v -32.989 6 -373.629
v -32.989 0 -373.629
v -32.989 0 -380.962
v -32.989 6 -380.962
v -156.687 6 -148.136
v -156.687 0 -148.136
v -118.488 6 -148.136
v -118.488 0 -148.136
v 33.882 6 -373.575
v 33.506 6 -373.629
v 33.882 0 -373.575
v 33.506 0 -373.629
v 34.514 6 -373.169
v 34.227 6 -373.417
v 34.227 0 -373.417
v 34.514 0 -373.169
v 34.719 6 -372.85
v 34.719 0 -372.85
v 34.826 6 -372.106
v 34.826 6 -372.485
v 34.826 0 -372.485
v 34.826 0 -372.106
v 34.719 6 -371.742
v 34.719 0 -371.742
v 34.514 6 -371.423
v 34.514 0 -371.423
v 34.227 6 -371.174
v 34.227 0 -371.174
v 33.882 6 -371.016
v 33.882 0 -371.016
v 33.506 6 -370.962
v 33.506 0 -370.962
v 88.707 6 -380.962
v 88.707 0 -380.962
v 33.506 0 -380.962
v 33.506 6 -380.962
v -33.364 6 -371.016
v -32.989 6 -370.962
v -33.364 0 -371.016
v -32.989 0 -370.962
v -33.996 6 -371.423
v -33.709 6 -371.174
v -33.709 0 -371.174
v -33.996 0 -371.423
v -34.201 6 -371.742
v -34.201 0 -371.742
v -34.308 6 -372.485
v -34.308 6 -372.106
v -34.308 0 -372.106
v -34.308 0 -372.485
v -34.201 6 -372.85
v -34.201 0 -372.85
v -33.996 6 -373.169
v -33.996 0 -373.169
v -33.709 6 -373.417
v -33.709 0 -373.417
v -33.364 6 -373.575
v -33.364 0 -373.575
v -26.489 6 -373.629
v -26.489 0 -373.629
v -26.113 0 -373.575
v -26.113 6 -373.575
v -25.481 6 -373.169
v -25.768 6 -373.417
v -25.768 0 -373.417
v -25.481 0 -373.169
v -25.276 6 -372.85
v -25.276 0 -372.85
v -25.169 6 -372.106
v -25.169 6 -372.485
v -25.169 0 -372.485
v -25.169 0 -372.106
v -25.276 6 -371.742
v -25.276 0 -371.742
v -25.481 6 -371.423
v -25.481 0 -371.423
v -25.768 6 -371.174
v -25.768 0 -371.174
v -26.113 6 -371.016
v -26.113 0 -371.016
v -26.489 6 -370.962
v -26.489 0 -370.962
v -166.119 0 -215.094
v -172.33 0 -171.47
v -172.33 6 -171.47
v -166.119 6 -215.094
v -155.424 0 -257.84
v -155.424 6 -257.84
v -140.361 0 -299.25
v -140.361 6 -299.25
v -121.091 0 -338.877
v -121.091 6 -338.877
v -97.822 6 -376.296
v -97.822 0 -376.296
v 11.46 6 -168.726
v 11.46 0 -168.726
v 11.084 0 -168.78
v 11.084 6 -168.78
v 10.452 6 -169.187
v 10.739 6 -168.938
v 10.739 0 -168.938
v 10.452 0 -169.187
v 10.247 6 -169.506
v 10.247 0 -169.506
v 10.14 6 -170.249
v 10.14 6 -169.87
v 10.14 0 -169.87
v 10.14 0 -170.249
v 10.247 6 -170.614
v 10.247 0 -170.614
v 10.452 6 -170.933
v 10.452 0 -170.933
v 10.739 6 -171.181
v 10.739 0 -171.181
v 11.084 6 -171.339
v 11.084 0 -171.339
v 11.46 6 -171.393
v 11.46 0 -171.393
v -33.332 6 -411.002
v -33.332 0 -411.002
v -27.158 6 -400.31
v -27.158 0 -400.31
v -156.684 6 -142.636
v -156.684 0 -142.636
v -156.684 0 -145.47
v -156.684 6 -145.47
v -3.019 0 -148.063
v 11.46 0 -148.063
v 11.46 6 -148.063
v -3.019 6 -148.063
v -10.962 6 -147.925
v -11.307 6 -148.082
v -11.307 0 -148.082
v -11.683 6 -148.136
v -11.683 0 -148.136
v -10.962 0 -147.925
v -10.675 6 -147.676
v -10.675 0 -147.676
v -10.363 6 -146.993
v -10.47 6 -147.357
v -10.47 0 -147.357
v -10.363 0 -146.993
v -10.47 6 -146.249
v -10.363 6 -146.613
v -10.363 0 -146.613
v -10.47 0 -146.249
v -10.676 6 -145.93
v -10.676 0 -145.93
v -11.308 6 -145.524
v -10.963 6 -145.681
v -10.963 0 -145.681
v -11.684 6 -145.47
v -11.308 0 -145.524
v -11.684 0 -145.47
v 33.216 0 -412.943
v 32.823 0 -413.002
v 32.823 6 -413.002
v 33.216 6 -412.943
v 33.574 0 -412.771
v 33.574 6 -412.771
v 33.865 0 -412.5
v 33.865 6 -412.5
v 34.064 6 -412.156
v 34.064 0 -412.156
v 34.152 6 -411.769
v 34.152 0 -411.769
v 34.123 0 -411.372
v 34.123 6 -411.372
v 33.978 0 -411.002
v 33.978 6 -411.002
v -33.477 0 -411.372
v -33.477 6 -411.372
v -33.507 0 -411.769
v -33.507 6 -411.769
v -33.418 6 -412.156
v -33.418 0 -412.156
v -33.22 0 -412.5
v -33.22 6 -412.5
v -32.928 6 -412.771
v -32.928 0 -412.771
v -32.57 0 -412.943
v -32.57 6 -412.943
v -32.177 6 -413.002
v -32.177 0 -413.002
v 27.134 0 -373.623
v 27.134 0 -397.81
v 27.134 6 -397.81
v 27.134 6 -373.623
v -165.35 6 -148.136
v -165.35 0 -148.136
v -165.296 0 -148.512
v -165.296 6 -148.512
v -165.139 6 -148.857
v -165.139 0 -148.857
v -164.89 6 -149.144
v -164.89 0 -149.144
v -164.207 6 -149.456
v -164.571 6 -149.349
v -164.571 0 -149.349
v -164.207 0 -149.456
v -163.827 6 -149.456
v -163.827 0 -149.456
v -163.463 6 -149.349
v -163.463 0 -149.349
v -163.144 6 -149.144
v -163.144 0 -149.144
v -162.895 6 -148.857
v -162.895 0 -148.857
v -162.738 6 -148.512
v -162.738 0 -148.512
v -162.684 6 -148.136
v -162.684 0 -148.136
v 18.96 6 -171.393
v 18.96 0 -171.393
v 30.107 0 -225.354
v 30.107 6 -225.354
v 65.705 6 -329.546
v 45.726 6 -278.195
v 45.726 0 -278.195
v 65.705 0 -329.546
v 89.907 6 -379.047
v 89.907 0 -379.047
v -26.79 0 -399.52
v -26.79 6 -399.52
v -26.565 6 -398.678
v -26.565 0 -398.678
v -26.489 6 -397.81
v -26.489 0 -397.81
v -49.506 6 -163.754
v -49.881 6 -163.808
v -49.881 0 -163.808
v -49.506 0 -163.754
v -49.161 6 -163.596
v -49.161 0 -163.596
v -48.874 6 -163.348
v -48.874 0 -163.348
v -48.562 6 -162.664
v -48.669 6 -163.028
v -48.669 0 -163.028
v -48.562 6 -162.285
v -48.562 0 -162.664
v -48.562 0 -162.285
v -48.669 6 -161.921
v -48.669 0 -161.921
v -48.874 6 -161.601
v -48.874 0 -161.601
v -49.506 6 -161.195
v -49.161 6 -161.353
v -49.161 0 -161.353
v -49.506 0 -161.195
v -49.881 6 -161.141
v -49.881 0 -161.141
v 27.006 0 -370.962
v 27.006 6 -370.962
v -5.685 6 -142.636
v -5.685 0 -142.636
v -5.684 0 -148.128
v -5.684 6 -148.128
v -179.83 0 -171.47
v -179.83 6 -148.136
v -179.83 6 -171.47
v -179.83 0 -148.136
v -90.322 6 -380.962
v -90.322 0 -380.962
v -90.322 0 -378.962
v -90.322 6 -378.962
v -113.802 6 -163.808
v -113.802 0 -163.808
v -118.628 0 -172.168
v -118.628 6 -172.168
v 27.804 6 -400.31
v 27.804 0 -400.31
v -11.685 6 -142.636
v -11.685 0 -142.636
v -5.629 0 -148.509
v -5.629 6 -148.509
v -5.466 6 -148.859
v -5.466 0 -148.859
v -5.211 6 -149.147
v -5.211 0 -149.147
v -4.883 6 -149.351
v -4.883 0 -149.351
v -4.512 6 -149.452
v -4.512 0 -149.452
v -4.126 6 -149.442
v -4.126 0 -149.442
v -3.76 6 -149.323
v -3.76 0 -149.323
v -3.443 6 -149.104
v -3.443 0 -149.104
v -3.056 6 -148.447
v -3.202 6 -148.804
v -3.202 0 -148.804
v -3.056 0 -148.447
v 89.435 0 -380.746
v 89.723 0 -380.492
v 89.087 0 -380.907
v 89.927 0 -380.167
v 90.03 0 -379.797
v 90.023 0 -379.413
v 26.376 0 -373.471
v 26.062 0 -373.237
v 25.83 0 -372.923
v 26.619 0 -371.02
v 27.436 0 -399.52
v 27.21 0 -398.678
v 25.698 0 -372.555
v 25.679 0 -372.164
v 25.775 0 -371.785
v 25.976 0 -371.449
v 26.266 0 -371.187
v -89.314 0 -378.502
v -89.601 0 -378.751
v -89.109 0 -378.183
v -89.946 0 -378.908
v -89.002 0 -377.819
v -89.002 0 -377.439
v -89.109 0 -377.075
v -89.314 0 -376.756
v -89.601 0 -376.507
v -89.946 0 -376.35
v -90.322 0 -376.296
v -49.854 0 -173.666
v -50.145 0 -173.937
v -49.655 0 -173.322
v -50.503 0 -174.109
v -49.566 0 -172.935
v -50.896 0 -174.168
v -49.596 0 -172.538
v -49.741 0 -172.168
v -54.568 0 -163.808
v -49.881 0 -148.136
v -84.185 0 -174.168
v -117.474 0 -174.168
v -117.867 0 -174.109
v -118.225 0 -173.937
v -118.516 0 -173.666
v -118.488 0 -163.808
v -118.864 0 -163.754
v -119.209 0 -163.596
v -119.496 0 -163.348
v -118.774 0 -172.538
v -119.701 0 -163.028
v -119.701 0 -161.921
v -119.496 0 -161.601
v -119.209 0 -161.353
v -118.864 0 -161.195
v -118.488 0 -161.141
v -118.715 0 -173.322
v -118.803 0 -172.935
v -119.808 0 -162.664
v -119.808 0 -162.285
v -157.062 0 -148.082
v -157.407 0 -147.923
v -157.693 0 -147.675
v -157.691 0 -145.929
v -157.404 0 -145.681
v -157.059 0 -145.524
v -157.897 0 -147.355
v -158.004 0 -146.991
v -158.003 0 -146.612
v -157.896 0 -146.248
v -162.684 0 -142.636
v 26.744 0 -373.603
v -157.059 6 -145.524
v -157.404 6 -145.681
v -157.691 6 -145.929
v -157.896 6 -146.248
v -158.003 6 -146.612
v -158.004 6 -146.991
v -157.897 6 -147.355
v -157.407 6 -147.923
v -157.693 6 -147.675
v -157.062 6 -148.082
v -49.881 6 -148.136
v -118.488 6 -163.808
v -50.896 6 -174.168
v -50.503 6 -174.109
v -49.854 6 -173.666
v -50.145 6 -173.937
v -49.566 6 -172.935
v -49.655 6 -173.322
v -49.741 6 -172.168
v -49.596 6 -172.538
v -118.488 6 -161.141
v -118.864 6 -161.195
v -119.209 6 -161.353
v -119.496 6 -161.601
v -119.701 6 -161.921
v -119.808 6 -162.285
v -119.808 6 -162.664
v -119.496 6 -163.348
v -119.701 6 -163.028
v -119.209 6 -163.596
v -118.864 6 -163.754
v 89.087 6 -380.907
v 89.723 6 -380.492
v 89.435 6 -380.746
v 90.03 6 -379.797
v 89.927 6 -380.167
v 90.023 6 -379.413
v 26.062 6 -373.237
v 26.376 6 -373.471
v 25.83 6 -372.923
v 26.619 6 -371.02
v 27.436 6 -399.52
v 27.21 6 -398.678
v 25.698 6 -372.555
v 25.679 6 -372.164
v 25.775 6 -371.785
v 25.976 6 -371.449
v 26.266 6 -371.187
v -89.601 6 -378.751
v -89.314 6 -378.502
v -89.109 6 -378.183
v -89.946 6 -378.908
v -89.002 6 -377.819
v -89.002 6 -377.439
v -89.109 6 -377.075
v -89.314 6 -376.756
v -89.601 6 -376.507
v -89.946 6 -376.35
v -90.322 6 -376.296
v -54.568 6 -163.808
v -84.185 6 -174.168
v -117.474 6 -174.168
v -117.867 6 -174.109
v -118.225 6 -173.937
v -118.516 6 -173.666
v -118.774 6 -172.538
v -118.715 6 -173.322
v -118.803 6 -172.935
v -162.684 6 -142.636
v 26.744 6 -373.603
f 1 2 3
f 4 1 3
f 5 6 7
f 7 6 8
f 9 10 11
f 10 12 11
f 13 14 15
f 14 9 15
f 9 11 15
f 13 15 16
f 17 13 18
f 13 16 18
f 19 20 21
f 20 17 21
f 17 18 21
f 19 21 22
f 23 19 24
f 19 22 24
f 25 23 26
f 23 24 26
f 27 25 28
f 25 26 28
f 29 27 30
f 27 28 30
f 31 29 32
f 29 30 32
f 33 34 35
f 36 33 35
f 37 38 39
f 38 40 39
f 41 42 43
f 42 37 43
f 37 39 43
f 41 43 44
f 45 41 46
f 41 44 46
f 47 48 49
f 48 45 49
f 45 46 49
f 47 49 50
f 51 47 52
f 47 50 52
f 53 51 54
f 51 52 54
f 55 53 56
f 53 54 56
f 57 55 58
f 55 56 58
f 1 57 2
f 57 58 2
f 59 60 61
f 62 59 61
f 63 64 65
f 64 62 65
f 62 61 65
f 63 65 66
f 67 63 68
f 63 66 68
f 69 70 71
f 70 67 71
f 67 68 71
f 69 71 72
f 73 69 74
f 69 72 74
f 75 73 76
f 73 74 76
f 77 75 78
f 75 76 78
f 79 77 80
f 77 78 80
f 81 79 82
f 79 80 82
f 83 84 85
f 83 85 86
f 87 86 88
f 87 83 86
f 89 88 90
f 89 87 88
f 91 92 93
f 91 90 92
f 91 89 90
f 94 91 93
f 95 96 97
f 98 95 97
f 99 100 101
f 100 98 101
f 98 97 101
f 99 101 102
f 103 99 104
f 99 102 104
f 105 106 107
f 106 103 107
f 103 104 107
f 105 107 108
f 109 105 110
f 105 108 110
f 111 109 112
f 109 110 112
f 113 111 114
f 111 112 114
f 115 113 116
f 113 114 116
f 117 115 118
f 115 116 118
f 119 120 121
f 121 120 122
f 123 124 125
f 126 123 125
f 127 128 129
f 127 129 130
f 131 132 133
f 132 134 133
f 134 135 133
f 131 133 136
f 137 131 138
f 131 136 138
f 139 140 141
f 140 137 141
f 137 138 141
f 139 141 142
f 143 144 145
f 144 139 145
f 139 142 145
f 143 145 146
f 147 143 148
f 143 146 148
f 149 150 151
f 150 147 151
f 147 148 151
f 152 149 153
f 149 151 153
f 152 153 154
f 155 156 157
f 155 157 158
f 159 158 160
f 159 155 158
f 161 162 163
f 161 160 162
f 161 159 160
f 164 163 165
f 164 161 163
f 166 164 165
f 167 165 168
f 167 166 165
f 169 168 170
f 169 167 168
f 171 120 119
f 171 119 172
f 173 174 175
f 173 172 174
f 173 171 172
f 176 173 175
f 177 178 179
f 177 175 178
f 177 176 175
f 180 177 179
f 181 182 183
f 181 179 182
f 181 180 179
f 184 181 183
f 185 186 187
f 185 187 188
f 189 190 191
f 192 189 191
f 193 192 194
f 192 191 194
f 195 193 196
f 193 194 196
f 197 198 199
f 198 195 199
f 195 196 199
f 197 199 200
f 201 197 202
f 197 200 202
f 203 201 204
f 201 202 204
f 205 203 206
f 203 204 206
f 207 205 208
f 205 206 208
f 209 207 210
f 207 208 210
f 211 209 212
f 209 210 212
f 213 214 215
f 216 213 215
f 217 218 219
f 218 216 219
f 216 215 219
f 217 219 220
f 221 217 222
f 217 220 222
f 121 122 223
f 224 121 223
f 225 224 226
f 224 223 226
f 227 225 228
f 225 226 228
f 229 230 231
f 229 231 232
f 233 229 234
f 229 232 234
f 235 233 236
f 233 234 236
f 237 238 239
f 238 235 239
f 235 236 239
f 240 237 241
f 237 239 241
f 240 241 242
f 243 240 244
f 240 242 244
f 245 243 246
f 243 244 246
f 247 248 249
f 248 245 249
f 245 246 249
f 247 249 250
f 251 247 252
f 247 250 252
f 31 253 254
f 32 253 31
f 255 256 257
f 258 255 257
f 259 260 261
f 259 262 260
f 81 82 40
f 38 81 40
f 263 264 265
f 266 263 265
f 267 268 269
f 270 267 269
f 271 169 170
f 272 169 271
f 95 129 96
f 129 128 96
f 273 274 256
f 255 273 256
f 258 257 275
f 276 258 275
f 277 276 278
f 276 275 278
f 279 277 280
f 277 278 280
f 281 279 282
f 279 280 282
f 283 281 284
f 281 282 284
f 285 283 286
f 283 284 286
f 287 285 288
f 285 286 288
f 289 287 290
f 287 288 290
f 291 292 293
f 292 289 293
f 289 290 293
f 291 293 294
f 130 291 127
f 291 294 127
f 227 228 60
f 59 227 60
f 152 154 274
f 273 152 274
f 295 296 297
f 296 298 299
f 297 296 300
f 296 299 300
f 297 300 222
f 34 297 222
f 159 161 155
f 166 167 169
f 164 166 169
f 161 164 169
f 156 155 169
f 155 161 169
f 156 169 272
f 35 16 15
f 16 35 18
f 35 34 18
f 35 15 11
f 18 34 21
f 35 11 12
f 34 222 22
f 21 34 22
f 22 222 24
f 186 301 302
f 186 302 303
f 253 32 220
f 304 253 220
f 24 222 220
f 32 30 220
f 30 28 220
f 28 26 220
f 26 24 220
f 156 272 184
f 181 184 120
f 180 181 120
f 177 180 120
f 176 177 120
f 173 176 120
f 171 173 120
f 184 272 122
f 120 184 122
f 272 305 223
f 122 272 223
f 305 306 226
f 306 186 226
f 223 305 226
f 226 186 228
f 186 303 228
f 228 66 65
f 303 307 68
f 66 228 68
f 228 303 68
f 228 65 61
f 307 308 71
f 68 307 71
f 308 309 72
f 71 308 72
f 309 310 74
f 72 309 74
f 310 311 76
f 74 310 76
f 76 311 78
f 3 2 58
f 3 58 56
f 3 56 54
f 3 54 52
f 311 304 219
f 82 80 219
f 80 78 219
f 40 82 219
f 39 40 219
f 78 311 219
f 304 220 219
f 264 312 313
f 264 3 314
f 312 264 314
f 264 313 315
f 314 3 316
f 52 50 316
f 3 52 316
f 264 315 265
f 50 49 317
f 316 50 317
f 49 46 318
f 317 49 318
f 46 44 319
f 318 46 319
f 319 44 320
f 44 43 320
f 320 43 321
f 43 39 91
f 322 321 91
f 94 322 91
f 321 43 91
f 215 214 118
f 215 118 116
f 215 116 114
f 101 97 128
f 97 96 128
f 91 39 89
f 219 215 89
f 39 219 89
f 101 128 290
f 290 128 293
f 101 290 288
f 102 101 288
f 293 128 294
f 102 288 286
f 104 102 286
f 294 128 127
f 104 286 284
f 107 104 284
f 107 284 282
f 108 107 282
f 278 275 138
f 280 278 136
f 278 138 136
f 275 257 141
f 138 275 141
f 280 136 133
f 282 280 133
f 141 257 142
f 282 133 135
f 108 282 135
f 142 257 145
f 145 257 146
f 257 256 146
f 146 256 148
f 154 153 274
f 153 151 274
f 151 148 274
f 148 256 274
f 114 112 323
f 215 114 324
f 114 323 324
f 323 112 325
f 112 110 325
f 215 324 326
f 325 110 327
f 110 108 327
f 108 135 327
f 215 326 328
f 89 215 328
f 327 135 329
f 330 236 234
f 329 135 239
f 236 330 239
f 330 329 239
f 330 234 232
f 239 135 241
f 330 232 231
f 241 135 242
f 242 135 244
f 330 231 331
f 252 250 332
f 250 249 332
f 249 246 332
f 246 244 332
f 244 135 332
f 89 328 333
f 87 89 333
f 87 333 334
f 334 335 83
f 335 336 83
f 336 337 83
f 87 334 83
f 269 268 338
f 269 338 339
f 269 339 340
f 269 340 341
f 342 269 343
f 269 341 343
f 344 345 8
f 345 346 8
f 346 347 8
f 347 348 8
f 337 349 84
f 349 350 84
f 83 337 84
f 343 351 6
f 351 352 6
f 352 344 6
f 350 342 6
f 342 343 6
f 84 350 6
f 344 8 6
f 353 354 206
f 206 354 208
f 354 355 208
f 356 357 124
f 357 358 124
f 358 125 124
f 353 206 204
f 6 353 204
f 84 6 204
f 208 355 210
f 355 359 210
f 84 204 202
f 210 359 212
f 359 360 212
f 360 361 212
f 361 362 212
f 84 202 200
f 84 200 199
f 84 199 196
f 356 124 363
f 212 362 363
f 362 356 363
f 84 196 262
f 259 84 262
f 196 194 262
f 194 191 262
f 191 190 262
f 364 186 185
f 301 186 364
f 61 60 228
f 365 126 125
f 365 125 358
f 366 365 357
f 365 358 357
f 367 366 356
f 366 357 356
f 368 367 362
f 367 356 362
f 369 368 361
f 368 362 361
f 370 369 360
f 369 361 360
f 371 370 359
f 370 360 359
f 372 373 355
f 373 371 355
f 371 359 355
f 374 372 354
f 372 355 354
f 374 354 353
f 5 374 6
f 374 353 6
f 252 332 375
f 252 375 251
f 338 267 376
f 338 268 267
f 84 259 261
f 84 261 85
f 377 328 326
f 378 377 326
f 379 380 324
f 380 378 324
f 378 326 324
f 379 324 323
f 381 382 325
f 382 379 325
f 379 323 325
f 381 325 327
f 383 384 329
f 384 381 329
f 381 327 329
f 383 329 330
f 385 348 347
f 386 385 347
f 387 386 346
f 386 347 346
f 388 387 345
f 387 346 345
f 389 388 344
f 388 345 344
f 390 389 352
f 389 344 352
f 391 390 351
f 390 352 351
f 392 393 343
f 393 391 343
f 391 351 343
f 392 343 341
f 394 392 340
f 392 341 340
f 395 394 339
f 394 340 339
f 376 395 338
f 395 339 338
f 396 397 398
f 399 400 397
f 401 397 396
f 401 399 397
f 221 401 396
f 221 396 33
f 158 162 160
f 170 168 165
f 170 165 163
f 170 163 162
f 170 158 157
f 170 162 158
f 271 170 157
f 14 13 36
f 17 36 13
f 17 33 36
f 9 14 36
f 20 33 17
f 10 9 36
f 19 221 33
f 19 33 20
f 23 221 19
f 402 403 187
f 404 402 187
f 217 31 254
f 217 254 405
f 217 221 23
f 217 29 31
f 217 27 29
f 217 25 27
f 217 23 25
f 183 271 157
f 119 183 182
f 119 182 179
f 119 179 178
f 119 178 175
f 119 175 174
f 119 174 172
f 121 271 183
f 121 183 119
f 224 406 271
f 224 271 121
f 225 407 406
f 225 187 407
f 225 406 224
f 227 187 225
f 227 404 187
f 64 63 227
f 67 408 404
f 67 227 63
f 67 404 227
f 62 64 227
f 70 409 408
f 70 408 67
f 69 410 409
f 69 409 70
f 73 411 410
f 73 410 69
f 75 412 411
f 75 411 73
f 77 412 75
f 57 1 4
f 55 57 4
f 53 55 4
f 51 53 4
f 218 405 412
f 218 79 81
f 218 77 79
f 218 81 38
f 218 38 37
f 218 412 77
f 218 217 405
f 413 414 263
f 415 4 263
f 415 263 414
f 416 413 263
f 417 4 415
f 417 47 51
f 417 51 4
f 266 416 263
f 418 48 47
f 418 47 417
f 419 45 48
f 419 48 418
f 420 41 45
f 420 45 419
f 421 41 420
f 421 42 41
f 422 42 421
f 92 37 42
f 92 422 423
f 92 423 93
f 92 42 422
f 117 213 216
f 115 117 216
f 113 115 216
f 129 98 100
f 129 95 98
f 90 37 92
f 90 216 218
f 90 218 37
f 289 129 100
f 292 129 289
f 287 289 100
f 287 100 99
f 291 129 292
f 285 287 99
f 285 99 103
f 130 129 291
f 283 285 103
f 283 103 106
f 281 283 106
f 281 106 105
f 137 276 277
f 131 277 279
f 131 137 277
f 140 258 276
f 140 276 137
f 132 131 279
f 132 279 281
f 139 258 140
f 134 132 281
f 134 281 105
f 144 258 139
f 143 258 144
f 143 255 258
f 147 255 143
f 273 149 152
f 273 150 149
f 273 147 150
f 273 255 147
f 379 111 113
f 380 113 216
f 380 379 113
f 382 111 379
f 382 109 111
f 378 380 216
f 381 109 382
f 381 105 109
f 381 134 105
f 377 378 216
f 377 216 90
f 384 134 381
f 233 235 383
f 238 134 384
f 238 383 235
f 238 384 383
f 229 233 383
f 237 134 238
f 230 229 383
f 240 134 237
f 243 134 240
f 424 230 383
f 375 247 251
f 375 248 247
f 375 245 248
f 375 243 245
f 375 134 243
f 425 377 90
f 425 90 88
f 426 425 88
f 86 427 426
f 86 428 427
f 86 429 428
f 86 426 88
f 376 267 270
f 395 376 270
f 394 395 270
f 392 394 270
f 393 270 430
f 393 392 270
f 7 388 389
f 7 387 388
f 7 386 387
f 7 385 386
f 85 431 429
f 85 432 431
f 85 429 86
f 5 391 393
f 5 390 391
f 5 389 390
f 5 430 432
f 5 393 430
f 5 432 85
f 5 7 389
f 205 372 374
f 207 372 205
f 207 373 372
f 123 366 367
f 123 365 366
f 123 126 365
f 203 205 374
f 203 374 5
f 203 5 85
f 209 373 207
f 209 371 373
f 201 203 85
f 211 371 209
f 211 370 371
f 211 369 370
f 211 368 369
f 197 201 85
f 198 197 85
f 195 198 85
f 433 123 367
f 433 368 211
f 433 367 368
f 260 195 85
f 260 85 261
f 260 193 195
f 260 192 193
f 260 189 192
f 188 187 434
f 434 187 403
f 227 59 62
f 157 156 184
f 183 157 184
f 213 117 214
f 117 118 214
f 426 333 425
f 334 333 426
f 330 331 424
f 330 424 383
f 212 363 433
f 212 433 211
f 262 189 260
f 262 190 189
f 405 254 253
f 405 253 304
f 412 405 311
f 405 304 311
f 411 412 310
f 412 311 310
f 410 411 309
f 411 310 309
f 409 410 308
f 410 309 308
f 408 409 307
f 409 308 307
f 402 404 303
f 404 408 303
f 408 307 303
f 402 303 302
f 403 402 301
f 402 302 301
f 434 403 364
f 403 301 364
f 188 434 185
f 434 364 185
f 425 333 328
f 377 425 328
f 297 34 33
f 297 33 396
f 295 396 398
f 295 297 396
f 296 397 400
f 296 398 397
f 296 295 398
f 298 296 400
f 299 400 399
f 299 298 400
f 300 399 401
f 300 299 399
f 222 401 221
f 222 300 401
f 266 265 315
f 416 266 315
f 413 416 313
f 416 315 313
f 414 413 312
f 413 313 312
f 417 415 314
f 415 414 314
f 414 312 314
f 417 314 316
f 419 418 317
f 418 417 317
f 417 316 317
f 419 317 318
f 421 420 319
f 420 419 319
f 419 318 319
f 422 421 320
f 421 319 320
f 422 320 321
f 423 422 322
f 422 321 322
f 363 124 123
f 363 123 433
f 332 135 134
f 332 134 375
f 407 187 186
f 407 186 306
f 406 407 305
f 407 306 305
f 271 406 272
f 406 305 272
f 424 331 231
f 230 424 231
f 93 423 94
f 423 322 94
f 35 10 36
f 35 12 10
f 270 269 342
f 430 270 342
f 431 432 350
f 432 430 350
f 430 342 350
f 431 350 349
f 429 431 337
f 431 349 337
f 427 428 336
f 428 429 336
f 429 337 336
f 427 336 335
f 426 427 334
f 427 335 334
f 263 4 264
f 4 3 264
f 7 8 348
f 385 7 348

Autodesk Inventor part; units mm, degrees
ref_plane "YZ Plane" through (0, 0, 0) normal (1, 0, 0) x (0, 1, 0)
ref_plane "XZ Plane" through (0, 0, 0) normal (0, 1, 0) x (-1, 0, 0)
ref_plane "XY Plane" through (0, 0, 0) normal (0, 0, 1) x (1, 0, 0)
sketch "Sketch1" plane through (0, 0, 0) normal (0, 1, 0) x (-1, 0, 0)
  line L0 (113.8016, -163.8079) -> (118.6285, -172.1682)
  line L1 (113.8016, -163.8079) -> (118.4883, -163.8079)
  arc A0 (32.1771, -413.0024) -> (33.3318, -411.0024) centre (32.1771, -411.669) ccw
  line L2 (26.4886, -397.8099) -> (26.4886, -373.629)
  arc A1 (26.4886, -370.9624) -> (26.4886, -373.629) centre (26.4886, -372.2957) ccw
  line L3 (26.4886, -370.9624) -> (32.9886, -370.9624)
  arc A2 (32.9886, -373.629) -> (32.9886, -370.9624) centre (32.9886, -372.2957) ccw
  line L4 (32.9886, -373.629) -> (32.9886, -380.9624)
  line L5 (-88.7072, -380.9624) -> (-33.5061, -380.9624)
  line L6 (32.9886, -380.9624) -> (90.3221, -380.9624)
  arc A3 (-33.9776, -411.0024) -> (-32.8229, -413.0024) centre (-32.8229, -411.669) ccw
  arc A4 (-27.1344, -373.6228) -> (-27.0061, -370.9624) centre (-27.0061, -372.2957) ccw
  line L7 (-27.0061, -370.9624) -> (-33.5061, -370.9624)
  arc A5 (-33.5061, -370.9624) -> (-33.5061, -373.629) centre (-33.5061, -372.2957) ccw
  line L8 (-33.5061, -373.629) -> (-33.5061, -380.9624)
  line L9 (118.4883, -148.1364) -> (118.4883, -161.1412)
  line L10 (33.3318, -411.0024) -> (27.1585, -400.3099)
  arc A6 (26.4886, -397.8099) -> (27.1585, -400.3099) centre (31.4886, -397.8099) ccw
  line L11 (-27.1344, -397.8099) -> (-27.1344, -373.6228)
  line L12 (-33.9776, -411.0024) -> (-27.8043, -400.3099)
  arc A7 (-27.8043, -400.3099) -> (-27.1344, -397.8099) centre (-32.1344, -397.8099) ccw
  line L13 (-32.8229, -413.0024) -> (32.1771, -413.0024)
  line L14 (-11.4601, -148.0629) -> (-11.4601, -168.7264)
  line L15 (156.6836, -142.6364) -> (162.6836, -142.6364)
  line L16 (162.6836, -142.6364) -> (162.6836, -148.1364)
  line L17 (156.6866, -148.1364) -> (118.4883, -148.1364)
  line L18 (11.6836, -145.4697) -> (11.6846, -142.6364)
  line L19 (11.6846, -142.6364) -> (5.6846, -142.6364)
  line L20 (5.6846, -142.6364) -> (5.6845, -148.1281)
  line L21 (11.6831, -148.1364) -> (49.8814, -148.1364)
  arc A8 (11.6836, -145.4697) -> (11.6831, -148.1364) centre (11.6831, -146.803) ccw
  arc A9 (3.0194, -148.0629) -> (5.6845, -148.1281) centre (4.3512, -148.1281) ccw
  line L22 (-11.4601, -148.0629) -> (3.0194, -148.0629)
  line L23 (-11.4601, -171.393) -> (-18.9601, -171.393)
  arc A10 (-11.4601, -171.393) -> (-11.4601, -168.7264) centre (-11.4601, -170.0597) ccw
  line L24 (162.6836, -145.3864) -> (185.043, -145.3864) construction
  line L25 (21.6753, -413.0028) -> (-28.7481, -413.0028) construction
  line L26 (-0.3229, -413.0028) -> (-0.3229, -413.0028)
  arc A11 (-89.9069, -379.0472) -> (-88.7072, -380.9624) centre (-88.7072, -379.629) ccw
  line L27 (156.6836, -142.6364) -> (156.6836, -145.4697)
  line L28 (165.3503, -148.1364) -> (179.8299, -148.1364)
  arc A12 (156.6866, -148.1364) -> (156.6836, -145.4697) centre (156.6836, -146.803) ccw
  arc A13 (162.6836, -148.1364) -> (165.3503, -148.1364) centre (164.017, -148.1364) ccw
  line L29 (179.8299, -148.1364) -> (179.8299, -171.4697)
  line L30 (179.8299, -171.4697) -> (172.3299, -171.4697)
  line L31 (90.3221, -380.9624) -> (90.3221, -378.9624)
  line L32 (90.3221, -376.2957) -> (97.8221, -376.2957)
  arc A14 (90.3221, -376.2957) -> (90.3221, -378.9624) centre (90.3221, -377.629) ccw
  line L33 (118.4883, -161.1412) -> (118.4883, -164.2811)
  arc A15 (118.4883, -163.8079) -> (118.4883, -161.1412) centre (118.4883, -162.4745) ccw
  line L34 (84.1849, -148.1364) -> (84.1849, -155.2534)
  arc A16 (117.4738, -174.1682) -> (118.6285, -172.1682) centre (117.4738, -172.8349) ccw
  line L35 (84.1849, -174.1682) -> (117.4738, -174.1682)
  line L36 (54.5681, -163.8079) -> (49.7413, -172.1682)
  line L37 (54.5681, -163.8079) -> (49.8814, -163.8079)
  line L38 (49.8814, -148.1364) -> (49.8814, -161.1412)
  line L39 (49.8814, -161.1412) -> (49.8814, -164.2811)
  arc A17 (49.8814, -161.1412) -> (49.8814, -163.8079) centre (49.8814, -162.4745) ccw
  arc A18 (49.7413, -172.1682) -> (50.896, -174.1682) centre (50.896, -172.8349) ccw
  line L40 (84.1849, -174.1682) -> (50.896, -174.1682)
  arc A19 (97.8221, -376.2957) -> (172.3299, -171.4697) centre (-250.9666, -133.4553) ccw
  arc A20 (-89.9069, -379.0472) -> (-18.9601, -171.393) centre (-669.0585, -65.2283) ccw
  point P0 (-90.8396, -380.9624)
  point P1 (-27.3048, -399.1039)
  dimension "d102" = 2.6667
  dimension "d107" = 2.6667
  dimension "d108" = 6.5
  dimension "d109" = 2.6667
  dimension "d141" = 7.3333
  dimension "d142" = 5
  dimension "d170" = 13.0048
  dimension "d173" = 6
  dimension "d174" = 5.5
  dimension "d177" = 7.5
  dimension "d179" = 2.6667
  dimension "d181" = 232.826
  dimension "d183" = 264.8664
  dimension "d184" = 23.3301
  dimension "d186" = 57.3335
  dimension "d187" = 57.3335
  dimension "d189" = 6.5
  dimension "d190" = 7.3333
  dimension "d191" = 24.187
  dimension "d192" = 1.3333
  dimension "d202" = 6
  dimension "d203" = 1.3333
  dimension "d204" = 1.3333
  dimension "d208" = 191.29
  dimension "d209" = 2.6667
  dimension "d210" = 2.6667
  dimension "d211" = 14.4796
  dimension "d212" = 14.4796
  dimension "d213" = 61.3416
  dimension "d214" = 145
  dimension "d216" = 23.3333
  dimension "d217" = 7.5
  dimension "d220" = 7.5
  dimension "d221" = 2.6667
  dimension "d223" = 38.1984
  dimension "d226" = 61.3416
  dimension "d232" = 2.6667
  dimension "d233" = 2.6667
  dimension "d234" = 61.3416
  dimension "d235" = 60
  dimension "d236" = 33.2889
  dimension "d237" = 2
  dimension "d238" = 425
  dimension "d239" = 658.71
extrude "Extrusion4" add sketch "Sketch1" along normal blind 6 contours L1 A15 L9 L17 A12 L27 L15 L16 A13 L28 L29 L30 A19 L32 A14 L31 L6 L4 A2 L3 A1 L2 A6 L10 A0 L13 A3 L12 A7 L11 A4 L7 A5 L8 L5 A11 A20 L23 A10 L14 L22 A9 L20 L19 L18 A8 L21 L38 A17 L37 L36 A18 L40 L35 A16 L0
properties part number "Support C"
